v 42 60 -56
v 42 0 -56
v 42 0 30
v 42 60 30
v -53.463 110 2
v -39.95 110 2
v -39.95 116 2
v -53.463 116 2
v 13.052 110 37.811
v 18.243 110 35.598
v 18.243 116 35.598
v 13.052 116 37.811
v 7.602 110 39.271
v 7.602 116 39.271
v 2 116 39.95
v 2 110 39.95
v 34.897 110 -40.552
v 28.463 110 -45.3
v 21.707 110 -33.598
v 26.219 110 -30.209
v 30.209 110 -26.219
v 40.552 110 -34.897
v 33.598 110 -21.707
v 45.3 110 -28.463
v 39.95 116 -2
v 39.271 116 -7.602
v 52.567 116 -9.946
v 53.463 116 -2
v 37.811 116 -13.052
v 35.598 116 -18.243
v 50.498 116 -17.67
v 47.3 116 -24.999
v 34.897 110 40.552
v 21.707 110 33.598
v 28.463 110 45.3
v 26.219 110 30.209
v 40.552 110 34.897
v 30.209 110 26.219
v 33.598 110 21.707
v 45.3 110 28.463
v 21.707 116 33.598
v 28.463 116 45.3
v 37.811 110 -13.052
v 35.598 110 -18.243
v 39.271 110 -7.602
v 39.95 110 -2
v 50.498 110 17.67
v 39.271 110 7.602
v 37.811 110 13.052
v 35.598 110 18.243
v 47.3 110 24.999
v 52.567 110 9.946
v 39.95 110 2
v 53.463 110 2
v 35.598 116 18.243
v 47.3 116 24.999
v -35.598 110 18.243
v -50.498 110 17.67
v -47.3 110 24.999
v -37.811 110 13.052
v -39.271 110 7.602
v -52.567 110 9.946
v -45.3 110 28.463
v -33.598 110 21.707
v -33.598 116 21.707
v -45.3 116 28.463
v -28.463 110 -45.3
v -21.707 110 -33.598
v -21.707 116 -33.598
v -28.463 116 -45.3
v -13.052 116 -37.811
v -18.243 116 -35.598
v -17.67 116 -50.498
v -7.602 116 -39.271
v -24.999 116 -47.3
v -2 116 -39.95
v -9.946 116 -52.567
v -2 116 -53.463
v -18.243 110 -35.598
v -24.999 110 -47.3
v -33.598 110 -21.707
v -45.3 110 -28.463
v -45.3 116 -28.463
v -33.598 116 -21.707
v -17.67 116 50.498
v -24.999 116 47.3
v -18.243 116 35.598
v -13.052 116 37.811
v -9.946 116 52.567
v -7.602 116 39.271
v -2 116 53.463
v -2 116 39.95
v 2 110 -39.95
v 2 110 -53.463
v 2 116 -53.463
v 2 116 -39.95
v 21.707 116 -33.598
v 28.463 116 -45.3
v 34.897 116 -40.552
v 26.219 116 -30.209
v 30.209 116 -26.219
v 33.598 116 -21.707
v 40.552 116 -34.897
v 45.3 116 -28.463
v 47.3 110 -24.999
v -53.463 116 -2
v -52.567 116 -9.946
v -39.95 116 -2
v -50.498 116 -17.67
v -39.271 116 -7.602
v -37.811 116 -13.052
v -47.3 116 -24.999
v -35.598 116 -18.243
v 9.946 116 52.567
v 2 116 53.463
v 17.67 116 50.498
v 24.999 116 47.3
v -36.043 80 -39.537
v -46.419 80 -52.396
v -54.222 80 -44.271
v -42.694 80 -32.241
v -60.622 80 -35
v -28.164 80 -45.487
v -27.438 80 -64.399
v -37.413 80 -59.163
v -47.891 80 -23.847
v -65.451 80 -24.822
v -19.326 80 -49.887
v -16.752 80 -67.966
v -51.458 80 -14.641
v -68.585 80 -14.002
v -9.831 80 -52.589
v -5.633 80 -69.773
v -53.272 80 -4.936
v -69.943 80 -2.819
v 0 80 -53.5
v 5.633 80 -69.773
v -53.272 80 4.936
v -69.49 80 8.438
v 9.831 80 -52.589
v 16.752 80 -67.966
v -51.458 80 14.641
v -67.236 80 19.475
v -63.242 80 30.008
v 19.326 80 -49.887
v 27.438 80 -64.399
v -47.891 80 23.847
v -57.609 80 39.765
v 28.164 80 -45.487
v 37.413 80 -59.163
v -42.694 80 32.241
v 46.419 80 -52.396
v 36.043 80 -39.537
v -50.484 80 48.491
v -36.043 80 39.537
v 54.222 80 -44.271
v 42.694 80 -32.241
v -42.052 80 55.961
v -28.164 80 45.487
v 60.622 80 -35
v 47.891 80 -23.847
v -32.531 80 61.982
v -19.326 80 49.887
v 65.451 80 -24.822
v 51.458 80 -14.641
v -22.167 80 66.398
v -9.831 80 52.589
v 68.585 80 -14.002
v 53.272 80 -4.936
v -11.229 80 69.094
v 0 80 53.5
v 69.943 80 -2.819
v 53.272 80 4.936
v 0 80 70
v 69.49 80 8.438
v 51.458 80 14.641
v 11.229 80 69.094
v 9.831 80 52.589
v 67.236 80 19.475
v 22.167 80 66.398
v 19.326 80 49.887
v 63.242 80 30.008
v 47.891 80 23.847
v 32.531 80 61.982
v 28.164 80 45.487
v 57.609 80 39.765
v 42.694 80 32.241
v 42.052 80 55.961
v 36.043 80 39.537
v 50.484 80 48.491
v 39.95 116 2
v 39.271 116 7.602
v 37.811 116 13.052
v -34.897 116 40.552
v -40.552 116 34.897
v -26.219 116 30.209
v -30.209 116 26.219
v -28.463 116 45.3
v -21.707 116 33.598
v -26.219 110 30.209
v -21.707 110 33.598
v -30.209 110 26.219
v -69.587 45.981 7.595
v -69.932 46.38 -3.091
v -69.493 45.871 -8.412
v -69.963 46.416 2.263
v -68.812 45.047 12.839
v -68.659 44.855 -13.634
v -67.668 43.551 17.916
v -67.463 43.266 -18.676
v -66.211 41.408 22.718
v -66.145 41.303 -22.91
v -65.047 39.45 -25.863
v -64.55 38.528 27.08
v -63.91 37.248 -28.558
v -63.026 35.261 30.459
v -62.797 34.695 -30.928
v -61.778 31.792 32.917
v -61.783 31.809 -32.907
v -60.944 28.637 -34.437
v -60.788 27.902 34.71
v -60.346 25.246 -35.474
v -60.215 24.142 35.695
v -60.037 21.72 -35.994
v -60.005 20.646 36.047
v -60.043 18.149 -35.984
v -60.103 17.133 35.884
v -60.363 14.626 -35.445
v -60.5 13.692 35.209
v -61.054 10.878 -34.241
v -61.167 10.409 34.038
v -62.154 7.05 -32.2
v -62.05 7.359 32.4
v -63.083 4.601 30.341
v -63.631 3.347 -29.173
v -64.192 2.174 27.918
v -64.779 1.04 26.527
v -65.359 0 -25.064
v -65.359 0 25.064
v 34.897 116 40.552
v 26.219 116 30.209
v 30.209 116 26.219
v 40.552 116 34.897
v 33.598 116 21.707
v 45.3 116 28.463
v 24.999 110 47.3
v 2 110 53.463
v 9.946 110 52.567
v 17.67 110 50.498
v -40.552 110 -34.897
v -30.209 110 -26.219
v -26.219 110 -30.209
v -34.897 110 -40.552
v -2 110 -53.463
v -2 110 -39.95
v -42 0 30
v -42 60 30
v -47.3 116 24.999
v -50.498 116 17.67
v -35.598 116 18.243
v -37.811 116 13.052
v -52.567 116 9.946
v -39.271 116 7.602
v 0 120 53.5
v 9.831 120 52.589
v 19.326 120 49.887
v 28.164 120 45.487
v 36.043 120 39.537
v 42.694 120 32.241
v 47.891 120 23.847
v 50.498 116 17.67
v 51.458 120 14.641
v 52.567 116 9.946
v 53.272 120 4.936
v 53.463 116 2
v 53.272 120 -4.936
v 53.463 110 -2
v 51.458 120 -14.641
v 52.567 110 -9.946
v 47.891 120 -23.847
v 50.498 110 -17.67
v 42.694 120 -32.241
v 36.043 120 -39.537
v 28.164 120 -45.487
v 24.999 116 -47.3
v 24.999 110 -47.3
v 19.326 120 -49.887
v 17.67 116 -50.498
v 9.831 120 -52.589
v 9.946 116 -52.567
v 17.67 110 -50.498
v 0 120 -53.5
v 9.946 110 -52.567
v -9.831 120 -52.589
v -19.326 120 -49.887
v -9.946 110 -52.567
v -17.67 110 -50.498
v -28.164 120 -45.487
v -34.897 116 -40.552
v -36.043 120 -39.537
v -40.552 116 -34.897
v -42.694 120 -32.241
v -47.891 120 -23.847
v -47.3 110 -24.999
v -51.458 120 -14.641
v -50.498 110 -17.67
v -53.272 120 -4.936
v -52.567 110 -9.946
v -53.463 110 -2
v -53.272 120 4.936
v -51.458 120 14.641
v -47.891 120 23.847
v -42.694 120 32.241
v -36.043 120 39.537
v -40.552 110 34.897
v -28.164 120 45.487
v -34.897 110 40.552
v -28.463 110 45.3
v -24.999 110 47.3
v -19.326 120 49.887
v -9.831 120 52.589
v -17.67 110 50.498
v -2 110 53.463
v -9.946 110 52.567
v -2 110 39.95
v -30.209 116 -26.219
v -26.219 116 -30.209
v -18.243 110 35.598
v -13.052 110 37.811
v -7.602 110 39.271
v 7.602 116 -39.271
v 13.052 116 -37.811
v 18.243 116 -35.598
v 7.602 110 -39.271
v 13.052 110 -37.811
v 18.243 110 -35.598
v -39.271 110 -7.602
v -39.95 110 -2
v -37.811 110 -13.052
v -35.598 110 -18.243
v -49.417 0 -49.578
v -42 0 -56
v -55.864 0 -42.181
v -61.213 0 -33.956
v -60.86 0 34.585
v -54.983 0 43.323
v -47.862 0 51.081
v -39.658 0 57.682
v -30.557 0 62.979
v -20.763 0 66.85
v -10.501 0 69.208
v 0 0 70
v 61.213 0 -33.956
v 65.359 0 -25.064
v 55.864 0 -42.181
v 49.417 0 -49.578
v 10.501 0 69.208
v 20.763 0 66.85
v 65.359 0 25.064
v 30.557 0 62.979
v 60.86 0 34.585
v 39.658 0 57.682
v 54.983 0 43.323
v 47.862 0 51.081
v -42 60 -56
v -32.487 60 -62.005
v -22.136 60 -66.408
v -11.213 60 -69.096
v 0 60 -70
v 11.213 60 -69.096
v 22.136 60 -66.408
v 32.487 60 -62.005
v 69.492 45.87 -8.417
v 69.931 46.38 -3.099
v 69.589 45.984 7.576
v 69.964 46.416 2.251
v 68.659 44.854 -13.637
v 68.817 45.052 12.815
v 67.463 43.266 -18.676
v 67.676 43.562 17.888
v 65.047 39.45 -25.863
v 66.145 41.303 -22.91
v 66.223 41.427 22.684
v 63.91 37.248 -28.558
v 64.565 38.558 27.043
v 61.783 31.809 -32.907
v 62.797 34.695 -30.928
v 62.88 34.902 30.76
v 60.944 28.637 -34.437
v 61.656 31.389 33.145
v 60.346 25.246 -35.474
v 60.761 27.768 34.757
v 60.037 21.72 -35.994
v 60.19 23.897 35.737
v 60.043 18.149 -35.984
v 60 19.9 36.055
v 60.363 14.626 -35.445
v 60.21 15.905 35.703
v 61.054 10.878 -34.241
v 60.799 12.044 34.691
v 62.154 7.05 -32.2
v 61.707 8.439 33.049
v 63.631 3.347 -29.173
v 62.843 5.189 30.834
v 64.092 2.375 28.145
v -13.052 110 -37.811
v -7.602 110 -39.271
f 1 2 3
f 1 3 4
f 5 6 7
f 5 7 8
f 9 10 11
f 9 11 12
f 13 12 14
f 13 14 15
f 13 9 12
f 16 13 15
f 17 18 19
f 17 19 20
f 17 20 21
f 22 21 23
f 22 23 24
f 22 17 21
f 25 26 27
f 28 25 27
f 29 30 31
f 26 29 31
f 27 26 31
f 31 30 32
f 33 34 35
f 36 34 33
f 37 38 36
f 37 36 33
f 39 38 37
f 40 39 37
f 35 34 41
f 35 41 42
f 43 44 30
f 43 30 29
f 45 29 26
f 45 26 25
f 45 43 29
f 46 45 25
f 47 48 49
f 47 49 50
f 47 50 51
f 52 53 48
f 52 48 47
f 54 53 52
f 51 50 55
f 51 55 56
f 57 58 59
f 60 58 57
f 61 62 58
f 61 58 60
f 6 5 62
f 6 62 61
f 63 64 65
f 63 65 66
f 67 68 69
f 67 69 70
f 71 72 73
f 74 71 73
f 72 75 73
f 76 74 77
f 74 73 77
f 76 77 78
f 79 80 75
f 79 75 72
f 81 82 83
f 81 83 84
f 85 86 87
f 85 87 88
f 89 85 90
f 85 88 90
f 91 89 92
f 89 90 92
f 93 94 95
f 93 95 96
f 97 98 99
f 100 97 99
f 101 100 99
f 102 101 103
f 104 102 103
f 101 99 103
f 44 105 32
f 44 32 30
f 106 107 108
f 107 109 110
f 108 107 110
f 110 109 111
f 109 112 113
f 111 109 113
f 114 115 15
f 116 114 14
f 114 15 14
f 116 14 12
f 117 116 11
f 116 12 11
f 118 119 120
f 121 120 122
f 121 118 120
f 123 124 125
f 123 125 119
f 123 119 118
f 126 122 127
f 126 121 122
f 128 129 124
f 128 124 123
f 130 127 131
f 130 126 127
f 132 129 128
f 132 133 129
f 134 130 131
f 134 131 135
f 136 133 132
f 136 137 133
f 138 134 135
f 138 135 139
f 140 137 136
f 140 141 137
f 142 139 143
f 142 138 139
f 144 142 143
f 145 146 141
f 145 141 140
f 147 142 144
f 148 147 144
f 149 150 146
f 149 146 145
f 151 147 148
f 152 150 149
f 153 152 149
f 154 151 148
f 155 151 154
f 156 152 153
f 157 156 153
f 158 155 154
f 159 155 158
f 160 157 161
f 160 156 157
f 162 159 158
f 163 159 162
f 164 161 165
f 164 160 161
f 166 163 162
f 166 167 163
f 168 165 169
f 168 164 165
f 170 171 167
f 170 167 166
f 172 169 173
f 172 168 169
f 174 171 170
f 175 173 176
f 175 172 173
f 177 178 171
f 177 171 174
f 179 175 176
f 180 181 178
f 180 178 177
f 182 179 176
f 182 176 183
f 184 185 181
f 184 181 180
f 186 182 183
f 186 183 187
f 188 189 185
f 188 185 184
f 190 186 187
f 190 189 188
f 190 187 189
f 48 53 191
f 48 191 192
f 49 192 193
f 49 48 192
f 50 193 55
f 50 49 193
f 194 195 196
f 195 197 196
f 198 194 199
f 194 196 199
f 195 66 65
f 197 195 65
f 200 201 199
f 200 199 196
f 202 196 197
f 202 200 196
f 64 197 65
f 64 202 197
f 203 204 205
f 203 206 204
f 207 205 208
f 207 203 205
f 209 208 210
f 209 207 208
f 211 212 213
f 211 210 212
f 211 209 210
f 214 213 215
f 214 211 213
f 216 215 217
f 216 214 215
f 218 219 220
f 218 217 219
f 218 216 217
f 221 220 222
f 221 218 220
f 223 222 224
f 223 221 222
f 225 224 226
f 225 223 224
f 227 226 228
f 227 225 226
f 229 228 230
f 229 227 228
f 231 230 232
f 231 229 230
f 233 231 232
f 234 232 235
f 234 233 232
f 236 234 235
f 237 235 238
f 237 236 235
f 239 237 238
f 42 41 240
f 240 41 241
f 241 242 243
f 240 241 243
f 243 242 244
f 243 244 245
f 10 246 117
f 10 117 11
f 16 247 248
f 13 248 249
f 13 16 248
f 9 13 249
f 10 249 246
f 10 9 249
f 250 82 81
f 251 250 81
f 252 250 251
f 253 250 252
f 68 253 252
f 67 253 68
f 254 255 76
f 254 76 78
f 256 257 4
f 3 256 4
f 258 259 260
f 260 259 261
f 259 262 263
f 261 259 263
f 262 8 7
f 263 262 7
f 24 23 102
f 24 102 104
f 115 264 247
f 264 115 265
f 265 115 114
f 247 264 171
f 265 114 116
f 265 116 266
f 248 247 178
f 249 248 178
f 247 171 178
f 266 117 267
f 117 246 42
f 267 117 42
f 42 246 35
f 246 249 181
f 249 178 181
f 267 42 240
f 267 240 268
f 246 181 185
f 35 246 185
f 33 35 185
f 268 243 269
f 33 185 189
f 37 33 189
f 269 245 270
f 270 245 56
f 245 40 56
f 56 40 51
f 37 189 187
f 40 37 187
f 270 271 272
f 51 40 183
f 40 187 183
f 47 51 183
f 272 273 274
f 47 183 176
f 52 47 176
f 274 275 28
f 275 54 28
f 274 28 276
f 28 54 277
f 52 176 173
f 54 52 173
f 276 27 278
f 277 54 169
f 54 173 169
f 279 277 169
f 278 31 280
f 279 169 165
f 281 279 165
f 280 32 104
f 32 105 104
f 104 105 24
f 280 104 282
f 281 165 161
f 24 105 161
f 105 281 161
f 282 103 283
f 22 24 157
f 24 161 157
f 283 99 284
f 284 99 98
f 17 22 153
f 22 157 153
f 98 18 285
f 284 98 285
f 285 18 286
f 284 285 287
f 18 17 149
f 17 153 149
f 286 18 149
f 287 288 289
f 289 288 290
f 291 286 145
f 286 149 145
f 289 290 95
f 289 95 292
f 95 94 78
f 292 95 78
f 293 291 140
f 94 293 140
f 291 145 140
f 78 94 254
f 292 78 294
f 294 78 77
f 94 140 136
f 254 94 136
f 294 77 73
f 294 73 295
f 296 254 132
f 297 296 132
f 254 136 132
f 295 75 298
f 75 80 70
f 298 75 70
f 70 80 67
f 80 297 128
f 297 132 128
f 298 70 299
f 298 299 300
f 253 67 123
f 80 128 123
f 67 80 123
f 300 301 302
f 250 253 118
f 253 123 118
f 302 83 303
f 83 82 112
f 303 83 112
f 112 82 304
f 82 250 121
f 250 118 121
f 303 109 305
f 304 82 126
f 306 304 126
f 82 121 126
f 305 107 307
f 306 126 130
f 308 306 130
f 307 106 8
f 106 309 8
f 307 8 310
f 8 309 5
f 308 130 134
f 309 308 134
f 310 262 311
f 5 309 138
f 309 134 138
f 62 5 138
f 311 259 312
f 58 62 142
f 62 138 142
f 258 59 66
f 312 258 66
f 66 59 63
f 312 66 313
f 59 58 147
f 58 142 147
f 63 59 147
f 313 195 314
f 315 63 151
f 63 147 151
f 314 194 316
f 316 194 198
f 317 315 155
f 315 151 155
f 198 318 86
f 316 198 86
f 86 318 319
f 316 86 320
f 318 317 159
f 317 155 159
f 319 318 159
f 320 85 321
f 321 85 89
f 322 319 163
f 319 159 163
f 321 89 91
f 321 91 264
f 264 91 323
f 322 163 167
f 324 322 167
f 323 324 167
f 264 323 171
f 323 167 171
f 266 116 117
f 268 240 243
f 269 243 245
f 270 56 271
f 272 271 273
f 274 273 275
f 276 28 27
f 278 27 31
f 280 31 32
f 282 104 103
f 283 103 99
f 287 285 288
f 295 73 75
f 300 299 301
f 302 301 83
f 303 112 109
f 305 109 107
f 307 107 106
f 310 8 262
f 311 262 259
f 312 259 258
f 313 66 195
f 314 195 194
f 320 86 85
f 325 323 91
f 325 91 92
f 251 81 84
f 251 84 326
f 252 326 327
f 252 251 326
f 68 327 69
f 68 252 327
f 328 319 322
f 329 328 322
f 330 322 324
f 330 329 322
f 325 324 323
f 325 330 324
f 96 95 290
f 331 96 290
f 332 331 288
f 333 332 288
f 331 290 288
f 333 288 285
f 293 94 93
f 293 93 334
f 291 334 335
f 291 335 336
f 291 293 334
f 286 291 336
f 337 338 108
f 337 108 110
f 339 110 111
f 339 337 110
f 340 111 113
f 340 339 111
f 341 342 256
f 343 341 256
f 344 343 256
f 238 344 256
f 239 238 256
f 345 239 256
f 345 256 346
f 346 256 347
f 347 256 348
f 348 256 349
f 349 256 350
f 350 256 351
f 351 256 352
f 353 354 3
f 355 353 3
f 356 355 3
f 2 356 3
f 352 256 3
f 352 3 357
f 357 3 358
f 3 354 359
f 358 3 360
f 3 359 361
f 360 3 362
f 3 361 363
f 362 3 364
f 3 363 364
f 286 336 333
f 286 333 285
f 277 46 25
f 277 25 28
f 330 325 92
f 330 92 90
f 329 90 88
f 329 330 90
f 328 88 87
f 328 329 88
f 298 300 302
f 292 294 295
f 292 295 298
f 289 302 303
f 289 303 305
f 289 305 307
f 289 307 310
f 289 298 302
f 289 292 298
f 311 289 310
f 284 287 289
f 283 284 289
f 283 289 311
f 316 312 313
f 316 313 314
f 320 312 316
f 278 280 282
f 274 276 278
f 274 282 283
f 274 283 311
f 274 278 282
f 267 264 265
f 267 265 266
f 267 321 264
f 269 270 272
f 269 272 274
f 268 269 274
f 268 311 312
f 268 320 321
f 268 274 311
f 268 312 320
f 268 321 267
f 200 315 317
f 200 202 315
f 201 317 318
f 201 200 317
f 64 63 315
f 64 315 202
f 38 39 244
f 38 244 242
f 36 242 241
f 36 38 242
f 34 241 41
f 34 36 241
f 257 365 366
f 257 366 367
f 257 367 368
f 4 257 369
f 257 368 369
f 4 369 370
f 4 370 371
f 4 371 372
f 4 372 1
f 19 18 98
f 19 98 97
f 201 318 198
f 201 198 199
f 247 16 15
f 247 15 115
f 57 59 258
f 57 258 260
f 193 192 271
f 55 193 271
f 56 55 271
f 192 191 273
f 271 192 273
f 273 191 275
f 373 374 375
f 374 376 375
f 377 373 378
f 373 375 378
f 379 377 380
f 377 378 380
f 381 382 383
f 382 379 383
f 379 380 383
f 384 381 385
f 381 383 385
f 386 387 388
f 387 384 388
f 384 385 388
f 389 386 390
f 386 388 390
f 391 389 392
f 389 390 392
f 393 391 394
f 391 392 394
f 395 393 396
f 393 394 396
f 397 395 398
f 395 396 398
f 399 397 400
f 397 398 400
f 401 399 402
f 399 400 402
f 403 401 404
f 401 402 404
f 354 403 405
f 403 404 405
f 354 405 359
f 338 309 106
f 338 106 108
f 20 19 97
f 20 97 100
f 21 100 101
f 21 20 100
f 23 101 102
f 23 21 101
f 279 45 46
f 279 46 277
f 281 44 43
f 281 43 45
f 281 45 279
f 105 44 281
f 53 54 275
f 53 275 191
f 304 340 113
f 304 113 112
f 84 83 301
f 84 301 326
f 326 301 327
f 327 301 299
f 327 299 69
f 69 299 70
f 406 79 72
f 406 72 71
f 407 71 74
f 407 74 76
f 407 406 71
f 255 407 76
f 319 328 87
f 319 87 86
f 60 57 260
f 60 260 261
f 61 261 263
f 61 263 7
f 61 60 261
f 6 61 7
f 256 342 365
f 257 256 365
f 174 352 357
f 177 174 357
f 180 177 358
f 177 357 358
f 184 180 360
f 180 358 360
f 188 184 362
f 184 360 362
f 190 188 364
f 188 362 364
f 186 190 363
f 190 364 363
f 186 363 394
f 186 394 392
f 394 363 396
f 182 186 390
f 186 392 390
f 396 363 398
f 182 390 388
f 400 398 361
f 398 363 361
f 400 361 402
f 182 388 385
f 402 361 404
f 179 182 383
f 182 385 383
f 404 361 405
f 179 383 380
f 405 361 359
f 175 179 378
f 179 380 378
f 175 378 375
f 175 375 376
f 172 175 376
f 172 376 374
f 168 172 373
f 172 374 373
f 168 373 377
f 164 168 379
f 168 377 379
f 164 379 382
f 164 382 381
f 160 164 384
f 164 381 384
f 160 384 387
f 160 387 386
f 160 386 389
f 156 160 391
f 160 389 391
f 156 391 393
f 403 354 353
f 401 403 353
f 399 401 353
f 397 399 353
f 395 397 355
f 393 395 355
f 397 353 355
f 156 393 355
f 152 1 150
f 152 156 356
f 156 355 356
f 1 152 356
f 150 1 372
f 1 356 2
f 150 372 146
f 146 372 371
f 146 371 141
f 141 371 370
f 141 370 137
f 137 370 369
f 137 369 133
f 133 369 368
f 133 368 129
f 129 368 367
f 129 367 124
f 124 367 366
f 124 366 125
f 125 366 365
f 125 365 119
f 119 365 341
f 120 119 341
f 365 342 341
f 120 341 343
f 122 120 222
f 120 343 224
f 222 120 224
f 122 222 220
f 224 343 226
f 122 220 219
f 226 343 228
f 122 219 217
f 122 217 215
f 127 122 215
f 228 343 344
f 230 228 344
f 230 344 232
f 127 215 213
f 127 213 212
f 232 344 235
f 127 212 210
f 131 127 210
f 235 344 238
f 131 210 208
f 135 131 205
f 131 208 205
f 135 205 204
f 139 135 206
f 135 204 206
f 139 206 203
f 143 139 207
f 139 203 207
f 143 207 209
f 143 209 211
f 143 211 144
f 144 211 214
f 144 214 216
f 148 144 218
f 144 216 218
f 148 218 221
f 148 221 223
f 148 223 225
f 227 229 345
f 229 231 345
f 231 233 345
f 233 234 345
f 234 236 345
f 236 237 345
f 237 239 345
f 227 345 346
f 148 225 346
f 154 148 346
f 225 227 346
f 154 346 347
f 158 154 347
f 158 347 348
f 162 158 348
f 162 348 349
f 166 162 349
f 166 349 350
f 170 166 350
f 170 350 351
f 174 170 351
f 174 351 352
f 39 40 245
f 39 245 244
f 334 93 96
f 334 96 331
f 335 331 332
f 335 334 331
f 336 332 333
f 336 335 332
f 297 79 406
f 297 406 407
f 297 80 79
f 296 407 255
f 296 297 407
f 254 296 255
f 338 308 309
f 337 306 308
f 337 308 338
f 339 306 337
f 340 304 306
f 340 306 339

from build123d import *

# Parameters (mm, degrees)
SKETCH_1_R               = 70
EXTRUDE_1_DEPTH          = 80
SKETCH_2_R               = 53.5
EXTRUDE_2_DEPTH          = 40
CUT_EXTRUDE_1_DEPTH      = 6
SKETCH_4_R               = 40
CUT_EXTRUDE_2_DEPTH      = 156.563491861
CUT_EXTRUDE_3_DEPTH      = 30
CUT_EXTRUDE_3_DEPTH_BACK = 156.563491951
SKETCH_5_W               = 84
SKETCH_5_H               = 120


with BuildPart() as part:
    # 草图1 → 凸台-拉伸1 (new body)
    with BuildSketch(Plane(origin=(0, 0, 0), x_dir=(1, 0, 0), z_dir=(0, 1, 0))):
        with Locations(Location((0, 0, 0), (0, 0, 270))):
            Circle(SKETCH_1_R)
    extrude(amount=EXTRUDE_1_DEPTH)

    # 草图2 → 凸台-拉伸2 (add)
    with BuildSketch(Plane(origin=(0, 80, 0), x_dir=(1, 0, 0), z_dir=(0, 1, 0))):
        with Locations(Location((0, 0, 0), (0, 0, 270))):
            Circle(SKETCH_2_R)
    extrude(amount=EXTRUDE_2_DEPTH)

    # 草图3 → 切除-拉伸1 (cut)
    with BuildSketch(Plane(origin=(0, 110, 0), x_dir=(1, 0, 0), z_dir=(0, 1, 0))):
        with BuildLine():
            ThreePointArc((-35.597687784, -18.242933548), (-38.637033052, -10.352761804), (-39.949968711, -2))
            Line((-39.949968711, -2), (-53.462603753, -2))
            ThreePointArc((-53.462603753, -2), (-51.677031706, -13.846818913), (-47.299973002, -24.999251069))
            Line((-47.299973002, -24.999251069), (-35.597687784, -18.242933548))
        make_face()
        with BuildLine():
            ThreePointArc((-39.949968711, 2), (-38.637033052, 10.352761804), (-35.597687784, 18.242933548))
            Line((-35.597687784, 18.242933548), (-47.299973002, 24.999251069))
            ThreePointArc((-47.299973002, 24.999251069), (-51.677031706, 13.846818913), (-53.462603753, 2))
            Line((-53.462603753, 2), (-39.949968711, 2))
        make_face()
        with BuildLine():
            ThreePointArc((-33.597687784, 21.707035163), (-28.284271247, 28.284271247), (-21.707035163, 33.597687784))
            Line((-21.707035163, 33.597687784), (-28.463352684, 45.299973002))
            ThreePointArc((-28.463352684, 45.299973002), (-37.830212793, 37.830212793), (-45.299973002, 28.463352684))
            Line((-45.299973002, 28.463352684), (-33.597687784, 21.707035163))
        make_face()
        with BuildLine():
            ThreePointArc((-18.242933548, 35.597687784), (-10.352761804, 38.637033052), (-2, 39.949968711))
            Line((-2, 39.949968711), (-2, 53.462603753))
            ThreePointArc((-2, 53.462603753), (-13.846818913, 51.677031706), (-24.999251069, 47.299973002))
            Line((-24.999251069, 47.299973002), (-18.242933548, 35.597687784))
        make_face()
        with BuildLine():
            Line((2, 53.462603753), (2, 39.949968711))
            ThreePointArc((2, 39.949968711), (10.352761804, 38.637033052), (18.242933548, 35.597687784))
            Line((18.242933548, 35.597687784), (24.999251069, 47.299973002))
            ThreePointArc((24.999251069, 47.299973002), (13.846818913, 51.677031706), (2, 53.462603753))
        make_face()
        with BuildLine():
            Line((28.463352684, 45.299973002), (21.707035163, 33.597687784))
            ThreePointArc((21.707035163, 33.597687784), (28.284271247, 28.284271247), (33.597687784, 21.707035163))
            Line((33.597687784, 21.707035163), (45.299973002, 28.463352684))
            ThreePointArc((45.299973002, 28.463352684), (37.830212793, 37.830212793), (28.463352684, 45.299973002))
        make_face()
        with BuildLine():
            Line((47.299973002, 24.999251069), (35.597687784, 18.242933548))
            ThreePointArc((35.597687784, 18.242933548), (38.637033052, 10.352761804), (39.949968711, 2))
            Line((39.949968711, 2), (53.462603753, 2))
            ThreePointArc((53.462603753, 2), (51.677031706, 13.846818913), (47.299973002, 24.999251069))
        make_face()
        with BuildLine():
            Line((53.462603753, -2), (39.949968711, -2))
            ThreePointArc((39.949968711, -2), (38.637033052, -10.352761804), (35.597687784, -18.242933548))
            Line((35.597687784, -18.242933548), (47.299973002, -24.999251069))
            ThreePointArc((47.299973002, -24.999251069), (51.677031706, -13.846818913), (53.462603753, -2))
        make_face()
        with BuildLine():
            Line((45.299973002, -28.463352684), (33.597687784, -21.707035163))
            ThreePointArc((33.597687784, -21.707035163), (28.284271247, -28.284271247), (21.707035163, -33.597687784))
            Line((21.707035163, -33.597687784), (28.463352684, -45.299973002))
            ThreePointArc((28.463352684, -45.299973002), (37.830212793, -37.830212793), (45.299973002, -28.463352684))
        make_face()
        with BuildLine():
            Line((24.999251069, -47.299973002), (18.242933548, -35.597687784))
            ThreePointArc((18.242933548, -35.597687784), (10.352761804, -38.637033052), (2, -39.949968711))
            Line((2, -39.949968711), (2, -53.462603753))
            ThreePointArc((2, -53.462603753), (13.846818913, -51.677031706), (24.999251069, -47.299973002))
        make_face()
        with BuildLine():
            ThreePointArc((-2, -39.949968711), (-10.352761804, -38.637033052), (-18.242933548, -35.597687784))
            Line((-18.242933548, -35.597687784), (-24.999251069, -47.299973002))
            ThreePointArc((-24.999251069, -47.299973002), (-13.846818913, -51.677031706), (-2, -53.462603753))
            Line((-2, -53.462603753), (-2, -39.949968711))
        make_face()
        with BuildLine():
            ThreePointArc((-21.707035163, -33.597687784), (-28.284271247, -28.284271247), (-33.597687784, -21.707035163))
            Line((-33.597687784, -21.707035163), (-45.299973002, -28.463352684))
            ThreePointArc((-45.299973002, -28.463352684), (-37.830212793, -37.830212793), (-28.463352684, -45.299973002))
            Line((-28.463352684, -45.299973002), (-21.707035163, -33.597687784))
        make_face()
    extrude(amount=CUT_EXTRUDE_1_DEPTH, mode=Mode.SUBTRACT)

    # 草图4 → 切除-拉伸2 (cut, symmetric)
    with BuildSketch(Plane.XY):
        with Locations((100, 20)):
            Circle(SKETCH_4_R)
    cut_extrude_2 = extrude(amount=CUT_EXTRUDE_2_DEPTH, both=True, mode=Mode.SUBTRACT)

    # 镜向1: 切除-拉伸2 across plane
    add(cut_extrude_2.mirror(Plane(origin=(0, 0, 0), x_dir=(0, 0, 1), z_dir=(1, 0, 0))), mode=Mode.SUBTRACT)

    # 草图5 → 切除-拉伸3 (cut, two sides: drawn at the far end of the back side and taken through both)
    with BuildSketch(Plane.XY.offset(-CUT_EXTRUDE_3_DEPTH_BACK)):
        Rectangle(SKETCH_5_W, SKETCH_5_H)
    extrude(amount=CUT_EXTRUDE_3_DEPTH + CUT_EXTRUDE_3_DEPTH_BACK, mode=Mode.SUBTRACT)


solid = part.part
